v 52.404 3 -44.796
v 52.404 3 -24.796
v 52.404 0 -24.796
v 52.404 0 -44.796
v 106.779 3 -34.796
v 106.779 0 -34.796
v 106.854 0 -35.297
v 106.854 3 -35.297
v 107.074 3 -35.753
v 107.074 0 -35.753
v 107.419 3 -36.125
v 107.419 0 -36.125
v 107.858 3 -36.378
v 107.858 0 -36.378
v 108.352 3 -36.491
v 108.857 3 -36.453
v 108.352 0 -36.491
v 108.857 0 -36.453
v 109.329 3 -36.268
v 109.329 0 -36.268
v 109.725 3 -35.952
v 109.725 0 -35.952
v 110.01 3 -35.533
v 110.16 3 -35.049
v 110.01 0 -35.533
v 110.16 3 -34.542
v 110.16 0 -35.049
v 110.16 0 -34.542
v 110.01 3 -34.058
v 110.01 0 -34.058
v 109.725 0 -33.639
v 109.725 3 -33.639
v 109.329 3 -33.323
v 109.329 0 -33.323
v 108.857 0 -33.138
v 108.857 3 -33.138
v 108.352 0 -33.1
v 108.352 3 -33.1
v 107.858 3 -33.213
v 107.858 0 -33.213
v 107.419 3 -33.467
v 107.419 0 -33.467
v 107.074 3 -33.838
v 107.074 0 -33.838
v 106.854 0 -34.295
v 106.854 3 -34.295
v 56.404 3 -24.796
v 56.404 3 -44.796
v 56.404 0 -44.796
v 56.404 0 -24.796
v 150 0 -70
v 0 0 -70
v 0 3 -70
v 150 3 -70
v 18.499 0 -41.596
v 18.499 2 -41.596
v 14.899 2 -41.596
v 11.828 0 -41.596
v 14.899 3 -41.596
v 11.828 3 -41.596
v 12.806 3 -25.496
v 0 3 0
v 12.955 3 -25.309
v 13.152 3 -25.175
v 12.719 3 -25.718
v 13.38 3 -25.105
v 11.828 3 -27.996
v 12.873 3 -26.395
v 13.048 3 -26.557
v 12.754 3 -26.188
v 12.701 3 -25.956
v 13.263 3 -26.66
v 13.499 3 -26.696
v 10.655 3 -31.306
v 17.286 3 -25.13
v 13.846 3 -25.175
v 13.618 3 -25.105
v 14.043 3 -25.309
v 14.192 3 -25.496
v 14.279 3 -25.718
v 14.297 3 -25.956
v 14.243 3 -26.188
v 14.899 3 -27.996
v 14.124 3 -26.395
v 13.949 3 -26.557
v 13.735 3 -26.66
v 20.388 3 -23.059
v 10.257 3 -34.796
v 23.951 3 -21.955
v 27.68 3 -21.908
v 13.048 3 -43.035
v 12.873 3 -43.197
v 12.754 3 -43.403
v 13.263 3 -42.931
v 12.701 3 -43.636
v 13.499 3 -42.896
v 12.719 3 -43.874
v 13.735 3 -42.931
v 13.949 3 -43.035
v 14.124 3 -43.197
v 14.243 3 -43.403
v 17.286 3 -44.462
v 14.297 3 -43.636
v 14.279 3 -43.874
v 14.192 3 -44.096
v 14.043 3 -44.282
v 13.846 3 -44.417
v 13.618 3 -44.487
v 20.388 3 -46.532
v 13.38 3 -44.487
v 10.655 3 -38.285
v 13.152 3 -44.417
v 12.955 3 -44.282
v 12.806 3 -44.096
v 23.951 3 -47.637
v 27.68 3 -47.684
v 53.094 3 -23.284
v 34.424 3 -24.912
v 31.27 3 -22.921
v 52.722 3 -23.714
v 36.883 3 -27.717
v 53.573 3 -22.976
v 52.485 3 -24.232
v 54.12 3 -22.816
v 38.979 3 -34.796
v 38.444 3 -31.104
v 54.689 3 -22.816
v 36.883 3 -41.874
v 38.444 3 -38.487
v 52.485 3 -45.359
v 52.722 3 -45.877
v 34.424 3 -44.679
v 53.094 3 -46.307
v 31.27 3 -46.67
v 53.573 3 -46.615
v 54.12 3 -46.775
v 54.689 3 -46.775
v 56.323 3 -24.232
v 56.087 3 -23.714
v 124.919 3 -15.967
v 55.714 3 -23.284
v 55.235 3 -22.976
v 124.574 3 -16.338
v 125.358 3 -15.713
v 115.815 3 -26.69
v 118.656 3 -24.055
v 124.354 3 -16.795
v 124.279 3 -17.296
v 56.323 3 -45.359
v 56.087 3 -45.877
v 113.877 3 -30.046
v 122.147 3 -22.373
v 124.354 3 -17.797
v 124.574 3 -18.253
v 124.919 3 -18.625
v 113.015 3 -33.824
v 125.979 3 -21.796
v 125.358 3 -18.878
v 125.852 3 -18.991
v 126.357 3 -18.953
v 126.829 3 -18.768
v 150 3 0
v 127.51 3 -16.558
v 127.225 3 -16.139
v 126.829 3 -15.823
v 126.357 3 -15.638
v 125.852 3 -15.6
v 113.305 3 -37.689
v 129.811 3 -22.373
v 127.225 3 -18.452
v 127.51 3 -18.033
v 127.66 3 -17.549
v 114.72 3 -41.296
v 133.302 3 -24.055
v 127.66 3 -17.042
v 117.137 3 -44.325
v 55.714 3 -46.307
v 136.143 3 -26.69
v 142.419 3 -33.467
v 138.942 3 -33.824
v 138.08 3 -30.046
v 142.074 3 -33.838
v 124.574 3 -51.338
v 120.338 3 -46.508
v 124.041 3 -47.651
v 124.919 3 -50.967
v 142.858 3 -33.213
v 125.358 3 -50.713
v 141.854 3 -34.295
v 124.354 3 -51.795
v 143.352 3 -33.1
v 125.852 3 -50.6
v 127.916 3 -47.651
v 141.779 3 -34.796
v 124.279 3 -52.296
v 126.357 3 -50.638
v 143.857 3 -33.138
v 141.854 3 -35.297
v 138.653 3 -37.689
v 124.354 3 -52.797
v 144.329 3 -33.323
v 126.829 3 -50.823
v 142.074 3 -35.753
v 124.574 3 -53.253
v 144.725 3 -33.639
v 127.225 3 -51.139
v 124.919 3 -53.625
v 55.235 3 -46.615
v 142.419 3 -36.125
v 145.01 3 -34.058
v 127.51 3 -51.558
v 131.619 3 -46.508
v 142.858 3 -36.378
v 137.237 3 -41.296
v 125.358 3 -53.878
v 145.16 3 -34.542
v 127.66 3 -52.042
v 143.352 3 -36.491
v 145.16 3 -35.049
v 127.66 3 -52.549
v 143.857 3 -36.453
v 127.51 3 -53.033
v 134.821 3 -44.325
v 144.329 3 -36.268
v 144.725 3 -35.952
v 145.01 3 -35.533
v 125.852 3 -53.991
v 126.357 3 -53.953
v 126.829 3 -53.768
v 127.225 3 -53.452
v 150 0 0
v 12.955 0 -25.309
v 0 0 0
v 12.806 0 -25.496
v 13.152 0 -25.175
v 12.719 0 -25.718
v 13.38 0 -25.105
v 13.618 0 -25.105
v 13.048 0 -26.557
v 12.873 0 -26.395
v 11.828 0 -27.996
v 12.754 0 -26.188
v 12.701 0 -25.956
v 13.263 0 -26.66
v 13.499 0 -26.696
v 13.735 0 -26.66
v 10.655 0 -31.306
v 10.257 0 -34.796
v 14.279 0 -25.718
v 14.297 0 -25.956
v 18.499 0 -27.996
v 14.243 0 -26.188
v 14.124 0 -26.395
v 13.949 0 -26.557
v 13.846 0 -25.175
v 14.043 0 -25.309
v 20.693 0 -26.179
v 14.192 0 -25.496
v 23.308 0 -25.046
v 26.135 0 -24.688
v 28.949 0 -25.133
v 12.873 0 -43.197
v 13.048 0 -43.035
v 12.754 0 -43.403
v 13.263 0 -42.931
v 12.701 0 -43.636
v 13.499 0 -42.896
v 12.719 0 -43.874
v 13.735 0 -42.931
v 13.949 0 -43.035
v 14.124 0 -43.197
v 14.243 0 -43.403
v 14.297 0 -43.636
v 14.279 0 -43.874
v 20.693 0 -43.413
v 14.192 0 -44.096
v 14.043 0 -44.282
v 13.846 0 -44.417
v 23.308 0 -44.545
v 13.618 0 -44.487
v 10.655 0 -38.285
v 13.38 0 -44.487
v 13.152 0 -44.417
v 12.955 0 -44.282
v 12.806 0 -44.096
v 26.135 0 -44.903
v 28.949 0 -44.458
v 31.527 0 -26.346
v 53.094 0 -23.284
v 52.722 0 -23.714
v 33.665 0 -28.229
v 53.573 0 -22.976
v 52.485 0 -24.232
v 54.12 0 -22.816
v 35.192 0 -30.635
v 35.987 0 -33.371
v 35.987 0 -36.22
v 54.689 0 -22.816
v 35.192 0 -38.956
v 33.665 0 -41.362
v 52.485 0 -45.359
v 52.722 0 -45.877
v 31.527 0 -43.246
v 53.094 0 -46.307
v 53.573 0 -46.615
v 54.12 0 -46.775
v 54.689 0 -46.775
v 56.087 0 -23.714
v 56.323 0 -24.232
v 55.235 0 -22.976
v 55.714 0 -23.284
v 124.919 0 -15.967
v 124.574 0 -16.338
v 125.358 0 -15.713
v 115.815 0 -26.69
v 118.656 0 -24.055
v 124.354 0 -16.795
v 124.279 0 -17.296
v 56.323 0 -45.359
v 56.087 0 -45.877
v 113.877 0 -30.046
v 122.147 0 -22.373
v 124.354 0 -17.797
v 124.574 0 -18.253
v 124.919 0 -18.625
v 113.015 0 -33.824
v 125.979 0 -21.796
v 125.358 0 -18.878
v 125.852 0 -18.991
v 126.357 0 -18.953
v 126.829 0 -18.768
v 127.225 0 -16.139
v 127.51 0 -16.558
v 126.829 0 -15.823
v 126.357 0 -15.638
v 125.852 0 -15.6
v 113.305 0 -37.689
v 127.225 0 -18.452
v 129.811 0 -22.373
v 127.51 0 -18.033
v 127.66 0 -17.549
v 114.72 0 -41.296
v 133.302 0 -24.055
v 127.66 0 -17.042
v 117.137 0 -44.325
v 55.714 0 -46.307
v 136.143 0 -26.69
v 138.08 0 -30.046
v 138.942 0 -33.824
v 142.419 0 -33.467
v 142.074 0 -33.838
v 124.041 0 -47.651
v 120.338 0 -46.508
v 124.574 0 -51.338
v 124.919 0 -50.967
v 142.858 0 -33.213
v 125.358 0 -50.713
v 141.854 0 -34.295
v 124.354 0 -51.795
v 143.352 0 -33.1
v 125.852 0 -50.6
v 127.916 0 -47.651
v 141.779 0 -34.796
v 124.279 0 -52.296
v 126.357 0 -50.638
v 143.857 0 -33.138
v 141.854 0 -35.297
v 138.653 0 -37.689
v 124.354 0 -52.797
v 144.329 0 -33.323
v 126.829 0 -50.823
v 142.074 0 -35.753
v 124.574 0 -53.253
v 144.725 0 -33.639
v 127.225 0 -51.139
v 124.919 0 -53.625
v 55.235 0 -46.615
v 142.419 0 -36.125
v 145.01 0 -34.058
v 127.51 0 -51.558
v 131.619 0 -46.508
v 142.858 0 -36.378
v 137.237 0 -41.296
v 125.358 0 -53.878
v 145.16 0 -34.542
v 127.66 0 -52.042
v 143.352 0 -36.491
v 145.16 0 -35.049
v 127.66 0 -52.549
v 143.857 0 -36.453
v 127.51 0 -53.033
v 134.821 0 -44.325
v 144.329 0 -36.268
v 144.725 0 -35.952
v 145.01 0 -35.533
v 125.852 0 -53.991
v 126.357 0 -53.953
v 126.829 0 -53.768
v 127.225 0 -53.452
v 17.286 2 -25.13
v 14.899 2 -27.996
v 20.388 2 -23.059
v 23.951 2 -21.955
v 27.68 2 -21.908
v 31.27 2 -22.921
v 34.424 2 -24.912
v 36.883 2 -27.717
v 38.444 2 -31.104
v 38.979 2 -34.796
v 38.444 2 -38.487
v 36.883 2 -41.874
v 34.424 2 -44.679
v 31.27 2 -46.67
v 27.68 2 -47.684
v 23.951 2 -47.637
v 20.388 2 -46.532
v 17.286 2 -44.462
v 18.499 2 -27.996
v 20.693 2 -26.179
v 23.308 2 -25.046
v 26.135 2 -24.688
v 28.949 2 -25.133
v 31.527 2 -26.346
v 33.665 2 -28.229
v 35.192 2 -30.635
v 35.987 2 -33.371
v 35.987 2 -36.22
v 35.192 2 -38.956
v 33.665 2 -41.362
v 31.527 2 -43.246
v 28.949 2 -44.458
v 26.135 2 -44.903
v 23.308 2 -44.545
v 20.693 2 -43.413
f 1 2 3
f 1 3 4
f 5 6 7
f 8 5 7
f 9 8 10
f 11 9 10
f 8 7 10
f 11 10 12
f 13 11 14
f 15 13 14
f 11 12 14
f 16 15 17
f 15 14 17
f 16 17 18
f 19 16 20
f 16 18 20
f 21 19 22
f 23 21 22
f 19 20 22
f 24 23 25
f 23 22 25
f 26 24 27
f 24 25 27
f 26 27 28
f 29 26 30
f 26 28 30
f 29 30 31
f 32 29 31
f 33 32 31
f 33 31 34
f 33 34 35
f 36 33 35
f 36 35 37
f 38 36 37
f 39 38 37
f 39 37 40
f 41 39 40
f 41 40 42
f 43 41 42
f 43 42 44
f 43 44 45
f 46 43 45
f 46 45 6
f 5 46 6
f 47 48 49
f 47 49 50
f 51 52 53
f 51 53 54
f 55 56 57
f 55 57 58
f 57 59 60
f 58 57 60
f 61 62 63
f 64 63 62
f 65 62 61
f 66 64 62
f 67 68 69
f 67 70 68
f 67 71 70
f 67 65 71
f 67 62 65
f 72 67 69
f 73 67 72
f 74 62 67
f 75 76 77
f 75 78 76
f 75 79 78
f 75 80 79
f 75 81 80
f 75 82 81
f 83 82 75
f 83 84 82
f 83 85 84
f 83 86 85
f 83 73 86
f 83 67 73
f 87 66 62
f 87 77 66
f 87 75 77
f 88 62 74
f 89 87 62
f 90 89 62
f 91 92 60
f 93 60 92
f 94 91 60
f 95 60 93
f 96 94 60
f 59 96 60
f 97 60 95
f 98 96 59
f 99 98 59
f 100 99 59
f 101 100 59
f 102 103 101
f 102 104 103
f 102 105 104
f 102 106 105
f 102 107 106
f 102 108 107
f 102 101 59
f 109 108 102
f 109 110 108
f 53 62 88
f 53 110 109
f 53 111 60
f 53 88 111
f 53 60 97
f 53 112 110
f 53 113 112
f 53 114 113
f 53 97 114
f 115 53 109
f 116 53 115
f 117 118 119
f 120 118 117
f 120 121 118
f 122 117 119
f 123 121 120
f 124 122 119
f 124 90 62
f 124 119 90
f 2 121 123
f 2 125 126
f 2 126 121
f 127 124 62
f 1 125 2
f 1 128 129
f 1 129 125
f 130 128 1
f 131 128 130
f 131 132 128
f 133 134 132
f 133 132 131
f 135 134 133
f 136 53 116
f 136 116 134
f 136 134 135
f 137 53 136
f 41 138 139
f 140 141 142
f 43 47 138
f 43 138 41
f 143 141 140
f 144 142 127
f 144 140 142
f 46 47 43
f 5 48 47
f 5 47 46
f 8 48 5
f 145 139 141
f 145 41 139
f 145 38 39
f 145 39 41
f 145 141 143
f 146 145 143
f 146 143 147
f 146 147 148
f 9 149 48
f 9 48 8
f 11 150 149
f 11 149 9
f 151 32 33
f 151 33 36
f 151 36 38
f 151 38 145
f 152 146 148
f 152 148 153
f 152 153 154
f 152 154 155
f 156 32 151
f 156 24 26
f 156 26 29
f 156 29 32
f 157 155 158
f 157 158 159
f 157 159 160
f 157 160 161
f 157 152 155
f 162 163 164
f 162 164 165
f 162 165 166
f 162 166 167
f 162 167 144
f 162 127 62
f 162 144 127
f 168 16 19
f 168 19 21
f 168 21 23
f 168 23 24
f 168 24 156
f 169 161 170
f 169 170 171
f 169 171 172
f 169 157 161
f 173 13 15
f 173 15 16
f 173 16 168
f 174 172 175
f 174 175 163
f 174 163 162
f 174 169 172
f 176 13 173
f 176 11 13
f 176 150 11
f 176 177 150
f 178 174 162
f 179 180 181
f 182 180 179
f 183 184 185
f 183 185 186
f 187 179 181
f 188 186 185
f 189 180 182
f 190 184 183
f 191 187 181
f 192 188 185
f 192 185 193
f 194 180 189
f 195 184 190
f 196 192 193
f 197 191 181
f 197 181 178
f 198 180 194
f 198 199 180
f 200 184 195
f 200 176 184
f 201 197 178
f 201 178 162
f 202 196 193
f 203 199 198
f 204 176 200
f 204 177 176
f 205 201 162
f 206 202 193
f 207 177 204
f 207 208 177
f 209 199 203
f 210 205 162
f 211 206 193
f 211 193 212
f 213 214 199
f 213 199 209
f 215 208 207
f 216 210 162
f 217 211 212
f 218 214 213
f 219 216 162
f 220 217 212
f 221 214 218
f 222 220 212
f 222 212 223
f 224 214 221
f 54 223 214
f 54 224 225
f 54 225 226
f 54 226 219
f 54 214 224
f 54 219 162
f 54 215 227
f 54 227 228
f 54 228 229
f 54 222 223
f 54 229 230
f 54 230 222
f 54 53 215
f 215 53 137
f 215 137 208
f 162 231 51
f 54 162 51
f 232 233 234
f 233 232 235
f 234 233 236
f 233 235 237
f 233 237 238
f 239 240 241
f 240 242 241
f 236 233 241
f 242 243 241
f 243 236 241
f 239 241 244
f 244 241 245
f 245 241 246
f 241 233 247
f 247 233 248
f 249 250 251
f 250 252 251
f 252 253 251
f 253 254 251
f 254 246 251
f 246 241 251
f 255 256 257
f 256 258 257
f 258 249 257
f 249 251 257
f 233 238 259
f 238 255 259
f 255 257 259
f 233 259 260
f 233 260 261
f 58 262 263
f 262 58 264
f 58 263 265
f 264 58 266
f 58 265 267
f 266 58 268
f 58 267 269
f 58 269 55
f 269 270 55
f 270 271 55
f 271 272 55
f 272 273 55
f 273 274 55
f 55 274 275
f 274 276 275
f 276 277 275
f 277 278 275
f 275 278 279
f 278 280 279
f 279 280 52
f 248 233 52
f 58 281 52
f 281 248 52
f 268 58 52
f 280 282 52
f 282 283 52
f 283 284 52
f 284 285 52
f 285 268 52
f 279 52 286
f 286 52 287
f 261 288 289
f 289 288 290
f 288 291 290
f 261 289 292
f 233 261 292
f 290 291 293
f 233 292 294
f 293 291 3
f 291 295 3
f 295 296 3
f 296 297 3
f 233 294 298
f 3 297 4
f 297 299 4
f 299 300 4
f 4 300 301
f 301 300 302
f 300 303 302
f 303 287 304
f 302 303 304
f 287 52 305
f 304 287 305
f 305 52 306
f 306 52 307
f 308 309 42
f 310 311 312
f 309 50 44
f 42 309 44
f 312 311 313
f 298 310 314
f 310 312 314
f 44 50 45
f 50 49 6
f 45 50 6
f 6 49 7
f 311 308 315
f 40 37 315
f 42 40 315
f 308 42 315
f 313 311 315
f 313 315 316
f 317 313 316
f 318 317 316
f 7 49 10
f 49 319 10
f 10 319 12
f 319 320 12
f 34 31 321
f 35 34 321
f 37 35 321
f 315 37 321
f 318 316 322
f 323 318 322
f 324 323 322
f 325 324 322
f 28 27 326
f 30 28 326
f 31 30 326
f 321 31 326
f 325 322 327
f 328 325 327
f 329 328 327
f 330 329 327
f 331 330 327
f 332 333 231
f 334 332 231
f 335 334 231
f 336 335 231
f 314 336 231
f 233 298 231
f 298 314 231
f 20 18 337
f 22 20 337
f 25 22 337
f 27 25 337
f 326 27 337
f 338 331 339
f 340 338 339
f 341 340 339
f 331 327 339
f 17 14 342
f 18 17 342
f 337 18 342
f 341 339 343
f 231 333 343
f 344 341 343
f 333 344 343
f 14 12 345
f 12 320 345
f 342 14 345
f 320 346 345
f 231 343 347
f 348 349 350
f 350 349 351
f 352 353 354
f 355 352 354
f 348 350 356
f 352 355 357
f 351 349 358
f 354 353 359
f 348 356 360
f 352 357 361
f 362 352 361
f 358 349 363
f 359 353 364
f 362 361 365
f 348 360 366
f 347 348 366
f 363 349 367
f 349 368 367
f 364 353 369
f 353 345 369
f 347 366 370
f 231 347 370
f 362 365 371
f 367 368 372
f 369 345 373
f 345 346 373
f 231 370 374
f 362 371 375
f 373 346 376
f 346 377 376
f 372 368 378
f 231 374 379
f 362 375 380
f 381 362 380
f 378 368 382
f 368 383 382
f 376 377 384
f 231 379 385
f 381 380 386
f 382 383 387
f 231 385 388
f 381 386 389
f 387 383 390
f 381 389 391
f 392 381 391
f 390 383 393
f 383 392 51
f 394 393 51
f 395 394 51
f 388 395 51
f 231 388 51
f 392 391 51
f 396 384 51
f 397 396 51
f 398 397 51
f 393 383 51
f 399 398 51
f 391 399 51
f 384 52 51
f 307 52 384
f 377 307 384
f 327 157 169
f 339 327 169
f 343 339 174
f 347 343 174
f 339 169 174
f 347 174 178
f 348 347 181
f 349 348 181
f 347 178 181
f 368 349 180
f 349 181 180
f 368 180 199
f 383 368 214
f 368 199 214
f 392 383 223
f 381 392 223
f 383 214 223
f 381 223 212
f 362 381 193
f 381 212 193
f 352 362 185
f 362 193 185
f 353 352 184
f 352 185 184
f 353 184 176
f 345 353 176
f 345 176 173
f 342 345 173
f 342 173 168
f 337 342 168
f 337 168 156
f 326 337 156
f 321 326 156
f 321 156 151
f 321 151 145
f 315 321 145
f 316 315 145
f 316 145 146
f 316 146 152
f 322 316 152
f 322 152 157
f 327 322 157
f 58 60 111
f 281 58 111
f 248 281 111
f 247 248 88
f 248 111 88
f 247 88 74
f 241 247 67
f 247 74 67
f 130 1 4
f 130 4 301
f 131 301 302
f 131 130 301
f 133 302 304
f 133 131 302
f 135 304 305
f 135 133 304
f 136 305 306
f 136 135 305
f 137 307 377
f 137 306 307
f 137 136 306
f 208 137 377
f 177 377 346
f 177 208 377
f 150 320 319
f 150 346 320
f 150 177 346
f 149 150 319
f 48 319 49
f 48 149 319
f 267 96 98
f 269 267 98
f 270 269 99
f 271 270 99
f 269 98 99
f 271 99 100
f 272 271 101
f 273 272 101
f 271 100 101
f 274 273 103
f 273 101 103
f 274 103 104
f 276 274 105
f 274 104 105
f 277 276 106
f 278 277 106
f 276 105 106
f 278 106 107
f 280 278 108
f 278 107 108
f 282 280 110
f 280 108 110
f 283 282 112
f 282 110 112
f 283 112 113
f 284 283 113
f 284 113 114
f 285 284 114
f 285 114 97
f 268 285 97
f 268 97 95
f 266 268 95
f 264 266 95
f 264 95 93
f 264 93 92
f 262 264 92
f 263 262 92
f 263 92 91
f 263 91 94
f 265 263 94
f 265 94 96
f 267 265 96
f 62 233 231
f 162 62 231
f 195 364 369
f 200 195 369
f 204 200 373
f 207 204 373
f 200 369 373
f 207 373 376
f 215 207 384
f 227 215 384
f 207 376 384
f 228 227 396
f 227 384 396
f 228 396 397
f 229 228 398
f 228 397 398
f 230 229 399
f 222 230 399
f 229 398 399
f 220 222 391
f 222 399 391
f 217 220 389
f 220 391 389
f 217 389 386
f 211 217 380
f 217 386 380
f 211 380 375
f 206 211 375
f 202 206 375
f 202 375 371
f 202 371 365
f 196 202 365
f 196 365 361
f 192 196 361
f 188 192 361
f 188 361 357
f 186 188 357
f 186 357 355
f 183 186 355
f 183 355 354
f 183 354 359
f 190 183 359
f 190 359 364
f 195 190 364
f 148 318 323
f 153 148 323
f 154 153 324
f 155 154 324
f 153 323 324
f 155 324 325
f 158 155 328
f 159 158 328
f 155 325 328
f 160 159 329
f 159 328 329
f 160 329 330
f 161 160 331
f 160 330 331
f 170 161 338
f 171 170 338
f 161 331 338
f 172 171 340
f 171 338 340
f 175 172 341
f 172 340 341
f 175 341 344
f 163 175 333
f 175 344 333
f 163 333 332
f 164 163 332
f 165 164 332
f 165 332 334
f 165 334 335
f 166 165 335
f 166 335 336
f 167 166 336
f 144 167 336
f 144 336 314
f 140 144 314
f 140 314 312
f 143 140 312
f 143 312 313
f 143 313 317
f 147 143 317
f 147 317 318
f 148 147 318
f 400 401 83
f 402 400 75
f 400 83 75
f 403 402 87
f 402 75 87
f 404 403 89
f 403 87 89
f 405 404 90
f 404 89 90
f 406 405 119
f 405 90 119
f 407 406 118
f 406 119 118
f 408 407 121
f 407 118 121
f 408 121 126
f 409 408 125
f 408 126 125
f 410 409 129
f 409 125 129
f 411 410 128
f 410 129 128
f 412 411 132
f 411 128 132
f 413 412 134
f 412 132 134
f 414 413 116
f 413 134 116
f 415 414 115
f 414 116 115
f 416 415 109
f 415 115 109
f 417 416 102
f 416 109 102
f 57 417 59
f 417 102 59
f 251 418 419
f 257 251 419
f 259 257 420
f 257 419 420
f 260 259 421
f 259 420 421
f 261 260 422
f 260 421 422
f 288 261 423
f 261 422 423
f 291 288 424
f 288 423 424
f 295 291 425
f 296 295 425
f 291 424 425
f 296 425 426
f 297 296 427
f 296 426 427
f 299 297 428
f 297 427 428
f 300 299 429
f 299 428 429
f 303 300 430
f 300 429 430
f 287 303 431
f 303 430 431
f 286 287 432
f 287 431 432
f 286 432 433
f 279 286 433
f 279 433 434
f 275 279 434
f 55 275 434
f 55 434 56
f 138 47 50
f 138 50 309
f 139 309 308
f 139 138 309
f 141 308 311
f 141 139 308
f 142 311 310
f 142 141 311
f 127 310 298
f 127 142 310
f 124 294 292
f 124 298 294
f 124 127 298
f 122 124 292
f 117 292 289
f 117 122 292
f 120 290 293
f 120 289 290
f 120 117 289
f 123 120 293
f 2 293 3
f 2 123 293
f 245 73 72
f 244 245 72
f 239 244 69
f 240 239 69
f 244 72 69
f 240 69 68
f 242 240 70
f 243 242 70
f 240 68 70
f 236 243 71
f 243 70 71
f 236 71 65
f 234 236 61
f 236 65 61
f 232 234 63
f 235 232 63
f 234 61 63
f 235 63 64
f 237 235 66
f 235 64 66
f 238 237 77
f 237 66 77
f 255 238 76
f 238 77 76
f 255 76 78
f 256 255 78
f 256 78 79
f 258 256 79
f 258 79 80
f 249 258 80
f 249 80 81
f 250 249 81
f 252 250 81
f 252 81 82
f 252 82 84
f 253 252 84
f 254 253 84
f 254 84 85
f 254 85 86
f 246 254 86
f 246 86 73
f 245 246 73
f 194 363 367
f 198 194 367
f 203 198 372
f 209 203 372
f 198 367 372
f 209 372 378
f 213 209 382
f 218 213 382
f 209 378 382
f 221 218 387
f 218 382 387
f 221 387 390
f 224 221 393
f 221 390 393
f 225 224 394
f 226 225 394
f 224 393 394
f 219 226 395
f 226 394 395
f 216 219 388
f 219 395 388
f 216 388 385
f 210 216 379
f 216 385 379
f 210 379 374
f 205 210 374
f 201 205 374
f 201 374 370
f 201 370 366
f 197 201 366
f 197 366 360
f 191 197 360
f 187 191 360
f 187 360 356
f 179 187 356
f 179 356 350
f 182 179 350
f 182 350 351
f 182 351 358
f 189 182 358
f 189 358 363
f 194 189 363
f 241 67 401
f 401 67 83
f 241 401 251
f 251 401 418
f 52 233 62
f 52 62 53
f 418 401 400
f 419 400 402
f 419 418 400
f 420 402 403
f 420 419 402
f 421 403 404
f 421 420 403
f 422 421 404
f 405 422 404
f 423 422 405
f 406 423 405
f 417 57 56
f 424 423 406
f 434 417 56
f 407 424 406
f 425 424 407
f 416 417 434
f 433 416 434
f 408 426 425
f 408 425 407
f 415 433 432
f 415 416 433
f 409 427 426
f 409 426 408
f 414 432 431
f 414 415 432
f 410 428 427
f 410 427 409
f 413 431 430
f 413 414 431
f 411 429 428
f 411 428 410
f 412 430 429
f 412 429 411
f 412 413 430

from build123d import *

# Parameters (mm, degrees)
SKETCH1_W                = 150
SKETCH1_H                = 70
BOSS_EXTRUDE1_DEPTH      = 3
SKETCH2_R                = 13
SKETCH2_R_2              = 0.8
CUT_EXTRUDE1_DEPTH       = 166.556636835
SKETCH3_R                = 13
CUT_EXTRUDE2_DEPTH       = 1
M3_CLEARANCE_HOLE1_D     = 3.4
M3_CLEARANCE_HOLE1_DEPTH = 7
M3_CLEARANCE_HOLE1_TIP   = 1.021463052


with BuildPart() as part:
    # Sketch1 → Boss-Extrude1 (new body)
    with BuildSketch(Plane(origin=(0, 0, 0), x_dir=(1, 0, 0), z_dir=(0, 1, 0))):
        with Locations((75, 35)):
            Rectangle(SKETCH1_W, SKETCH1_H)
    extrude(amount=BOSS_EXTRUDE1_DEPTH)

    # Sketch2 → Cut-Extrude1 (cut, through all)
    with BuildSketch(Plane(origin=(0, 3, 0), x_dir=(1, 0, 0), z_dir=(0, 1, 0))):
        with Locations(Location((125.978759571, 34.795735311, 0), (0, 0, 270))):
            Circle(SKETCH2_R)
        with Locations(Location((13.498759571, 43.695735311, 0), (0, 0, 270))):
            Circle(SKETCH2_R_2)
        with Locations(Location((13.498759571, 25.895735311, 0), (0, 0, 90))):
            Circle(SKETCH2_R_2)
        with BuildLine():
            Line((56.404199608, 44.795735311), (56.404199608, 24.795735311))
            ThreePointArc((56.404199608, 24.795735311), (54.404199608, 22.795735311), (52.404199608, 24.795735311))
            Line((52.404199608, 24.795735311), (52.404199608, 44.795735311))
            ThreePointArc((52.404199608, 44.795735311), (54.404199608, 46.795735311), (56.404199608, 44.795735311))
        make_face()
        with BuildLine():
            Line((18.498759571, 41.595735311), (11.828015738, 41.595735311))
            ThreePointArc((11.828015738, 41.595735311), (10.256762989, 34.795735311), (11.828015738, 27.995735311))
            Line((11.828015738, 27.995735311), (18.498759571, 27.995735311))
            ThreePointArc((18.498759571, 27.995735311), (36.08768632, 34.795735311), (18.498759571, 41.595735311))
        make_face()
    extrude(amount=-CUT_EXTRUDE1_DEPTH, mode=Mode.SUBTRACT)

    # Sketch3 → Cut-Extrude2 (cut)
    with BuildSketch(Plane(origin=(0, 3, 0), x_dir=(1, 0, 0), z_dir=(0, 1, 0))):
        with Locations((25.978759571, 34.795735311)):
            Circle(SKETCH3_R)
    extrude(amount=-CUT_EXTRUDE2_DEPTH, mode=Mode.SUBTRACT)

    # M3 Clearance Hole1
    with Locations(Plane(origin=(0, 3, 0), x_dir=(1, 0, 0), z_dir=(0, 1, 0))):
        with Locations((143.478759571, 34.795735311), (125.978759571, 52.295735311), (108.478759571, 34.795735311), (125.978759571, 17.295735311)):
            Hole(M3_CLEARANCE_HOLE1_D / 2, depth=M3_CLEARANCE_HOLE1_DEPTH)
            with Locations((0, 0, -(M3_CLEARANCE_HOLE1_DEPTH + M3_CLEARANCE_HOLE1_TIP / 2))):  # 118° drill point
                Cone(0, M3_CLEARANCE_HOLE1_D / 2, M3_CLEARANCE_HOLE1_TIP, mode=Mode.SUBTRACT)


solid = part.part
